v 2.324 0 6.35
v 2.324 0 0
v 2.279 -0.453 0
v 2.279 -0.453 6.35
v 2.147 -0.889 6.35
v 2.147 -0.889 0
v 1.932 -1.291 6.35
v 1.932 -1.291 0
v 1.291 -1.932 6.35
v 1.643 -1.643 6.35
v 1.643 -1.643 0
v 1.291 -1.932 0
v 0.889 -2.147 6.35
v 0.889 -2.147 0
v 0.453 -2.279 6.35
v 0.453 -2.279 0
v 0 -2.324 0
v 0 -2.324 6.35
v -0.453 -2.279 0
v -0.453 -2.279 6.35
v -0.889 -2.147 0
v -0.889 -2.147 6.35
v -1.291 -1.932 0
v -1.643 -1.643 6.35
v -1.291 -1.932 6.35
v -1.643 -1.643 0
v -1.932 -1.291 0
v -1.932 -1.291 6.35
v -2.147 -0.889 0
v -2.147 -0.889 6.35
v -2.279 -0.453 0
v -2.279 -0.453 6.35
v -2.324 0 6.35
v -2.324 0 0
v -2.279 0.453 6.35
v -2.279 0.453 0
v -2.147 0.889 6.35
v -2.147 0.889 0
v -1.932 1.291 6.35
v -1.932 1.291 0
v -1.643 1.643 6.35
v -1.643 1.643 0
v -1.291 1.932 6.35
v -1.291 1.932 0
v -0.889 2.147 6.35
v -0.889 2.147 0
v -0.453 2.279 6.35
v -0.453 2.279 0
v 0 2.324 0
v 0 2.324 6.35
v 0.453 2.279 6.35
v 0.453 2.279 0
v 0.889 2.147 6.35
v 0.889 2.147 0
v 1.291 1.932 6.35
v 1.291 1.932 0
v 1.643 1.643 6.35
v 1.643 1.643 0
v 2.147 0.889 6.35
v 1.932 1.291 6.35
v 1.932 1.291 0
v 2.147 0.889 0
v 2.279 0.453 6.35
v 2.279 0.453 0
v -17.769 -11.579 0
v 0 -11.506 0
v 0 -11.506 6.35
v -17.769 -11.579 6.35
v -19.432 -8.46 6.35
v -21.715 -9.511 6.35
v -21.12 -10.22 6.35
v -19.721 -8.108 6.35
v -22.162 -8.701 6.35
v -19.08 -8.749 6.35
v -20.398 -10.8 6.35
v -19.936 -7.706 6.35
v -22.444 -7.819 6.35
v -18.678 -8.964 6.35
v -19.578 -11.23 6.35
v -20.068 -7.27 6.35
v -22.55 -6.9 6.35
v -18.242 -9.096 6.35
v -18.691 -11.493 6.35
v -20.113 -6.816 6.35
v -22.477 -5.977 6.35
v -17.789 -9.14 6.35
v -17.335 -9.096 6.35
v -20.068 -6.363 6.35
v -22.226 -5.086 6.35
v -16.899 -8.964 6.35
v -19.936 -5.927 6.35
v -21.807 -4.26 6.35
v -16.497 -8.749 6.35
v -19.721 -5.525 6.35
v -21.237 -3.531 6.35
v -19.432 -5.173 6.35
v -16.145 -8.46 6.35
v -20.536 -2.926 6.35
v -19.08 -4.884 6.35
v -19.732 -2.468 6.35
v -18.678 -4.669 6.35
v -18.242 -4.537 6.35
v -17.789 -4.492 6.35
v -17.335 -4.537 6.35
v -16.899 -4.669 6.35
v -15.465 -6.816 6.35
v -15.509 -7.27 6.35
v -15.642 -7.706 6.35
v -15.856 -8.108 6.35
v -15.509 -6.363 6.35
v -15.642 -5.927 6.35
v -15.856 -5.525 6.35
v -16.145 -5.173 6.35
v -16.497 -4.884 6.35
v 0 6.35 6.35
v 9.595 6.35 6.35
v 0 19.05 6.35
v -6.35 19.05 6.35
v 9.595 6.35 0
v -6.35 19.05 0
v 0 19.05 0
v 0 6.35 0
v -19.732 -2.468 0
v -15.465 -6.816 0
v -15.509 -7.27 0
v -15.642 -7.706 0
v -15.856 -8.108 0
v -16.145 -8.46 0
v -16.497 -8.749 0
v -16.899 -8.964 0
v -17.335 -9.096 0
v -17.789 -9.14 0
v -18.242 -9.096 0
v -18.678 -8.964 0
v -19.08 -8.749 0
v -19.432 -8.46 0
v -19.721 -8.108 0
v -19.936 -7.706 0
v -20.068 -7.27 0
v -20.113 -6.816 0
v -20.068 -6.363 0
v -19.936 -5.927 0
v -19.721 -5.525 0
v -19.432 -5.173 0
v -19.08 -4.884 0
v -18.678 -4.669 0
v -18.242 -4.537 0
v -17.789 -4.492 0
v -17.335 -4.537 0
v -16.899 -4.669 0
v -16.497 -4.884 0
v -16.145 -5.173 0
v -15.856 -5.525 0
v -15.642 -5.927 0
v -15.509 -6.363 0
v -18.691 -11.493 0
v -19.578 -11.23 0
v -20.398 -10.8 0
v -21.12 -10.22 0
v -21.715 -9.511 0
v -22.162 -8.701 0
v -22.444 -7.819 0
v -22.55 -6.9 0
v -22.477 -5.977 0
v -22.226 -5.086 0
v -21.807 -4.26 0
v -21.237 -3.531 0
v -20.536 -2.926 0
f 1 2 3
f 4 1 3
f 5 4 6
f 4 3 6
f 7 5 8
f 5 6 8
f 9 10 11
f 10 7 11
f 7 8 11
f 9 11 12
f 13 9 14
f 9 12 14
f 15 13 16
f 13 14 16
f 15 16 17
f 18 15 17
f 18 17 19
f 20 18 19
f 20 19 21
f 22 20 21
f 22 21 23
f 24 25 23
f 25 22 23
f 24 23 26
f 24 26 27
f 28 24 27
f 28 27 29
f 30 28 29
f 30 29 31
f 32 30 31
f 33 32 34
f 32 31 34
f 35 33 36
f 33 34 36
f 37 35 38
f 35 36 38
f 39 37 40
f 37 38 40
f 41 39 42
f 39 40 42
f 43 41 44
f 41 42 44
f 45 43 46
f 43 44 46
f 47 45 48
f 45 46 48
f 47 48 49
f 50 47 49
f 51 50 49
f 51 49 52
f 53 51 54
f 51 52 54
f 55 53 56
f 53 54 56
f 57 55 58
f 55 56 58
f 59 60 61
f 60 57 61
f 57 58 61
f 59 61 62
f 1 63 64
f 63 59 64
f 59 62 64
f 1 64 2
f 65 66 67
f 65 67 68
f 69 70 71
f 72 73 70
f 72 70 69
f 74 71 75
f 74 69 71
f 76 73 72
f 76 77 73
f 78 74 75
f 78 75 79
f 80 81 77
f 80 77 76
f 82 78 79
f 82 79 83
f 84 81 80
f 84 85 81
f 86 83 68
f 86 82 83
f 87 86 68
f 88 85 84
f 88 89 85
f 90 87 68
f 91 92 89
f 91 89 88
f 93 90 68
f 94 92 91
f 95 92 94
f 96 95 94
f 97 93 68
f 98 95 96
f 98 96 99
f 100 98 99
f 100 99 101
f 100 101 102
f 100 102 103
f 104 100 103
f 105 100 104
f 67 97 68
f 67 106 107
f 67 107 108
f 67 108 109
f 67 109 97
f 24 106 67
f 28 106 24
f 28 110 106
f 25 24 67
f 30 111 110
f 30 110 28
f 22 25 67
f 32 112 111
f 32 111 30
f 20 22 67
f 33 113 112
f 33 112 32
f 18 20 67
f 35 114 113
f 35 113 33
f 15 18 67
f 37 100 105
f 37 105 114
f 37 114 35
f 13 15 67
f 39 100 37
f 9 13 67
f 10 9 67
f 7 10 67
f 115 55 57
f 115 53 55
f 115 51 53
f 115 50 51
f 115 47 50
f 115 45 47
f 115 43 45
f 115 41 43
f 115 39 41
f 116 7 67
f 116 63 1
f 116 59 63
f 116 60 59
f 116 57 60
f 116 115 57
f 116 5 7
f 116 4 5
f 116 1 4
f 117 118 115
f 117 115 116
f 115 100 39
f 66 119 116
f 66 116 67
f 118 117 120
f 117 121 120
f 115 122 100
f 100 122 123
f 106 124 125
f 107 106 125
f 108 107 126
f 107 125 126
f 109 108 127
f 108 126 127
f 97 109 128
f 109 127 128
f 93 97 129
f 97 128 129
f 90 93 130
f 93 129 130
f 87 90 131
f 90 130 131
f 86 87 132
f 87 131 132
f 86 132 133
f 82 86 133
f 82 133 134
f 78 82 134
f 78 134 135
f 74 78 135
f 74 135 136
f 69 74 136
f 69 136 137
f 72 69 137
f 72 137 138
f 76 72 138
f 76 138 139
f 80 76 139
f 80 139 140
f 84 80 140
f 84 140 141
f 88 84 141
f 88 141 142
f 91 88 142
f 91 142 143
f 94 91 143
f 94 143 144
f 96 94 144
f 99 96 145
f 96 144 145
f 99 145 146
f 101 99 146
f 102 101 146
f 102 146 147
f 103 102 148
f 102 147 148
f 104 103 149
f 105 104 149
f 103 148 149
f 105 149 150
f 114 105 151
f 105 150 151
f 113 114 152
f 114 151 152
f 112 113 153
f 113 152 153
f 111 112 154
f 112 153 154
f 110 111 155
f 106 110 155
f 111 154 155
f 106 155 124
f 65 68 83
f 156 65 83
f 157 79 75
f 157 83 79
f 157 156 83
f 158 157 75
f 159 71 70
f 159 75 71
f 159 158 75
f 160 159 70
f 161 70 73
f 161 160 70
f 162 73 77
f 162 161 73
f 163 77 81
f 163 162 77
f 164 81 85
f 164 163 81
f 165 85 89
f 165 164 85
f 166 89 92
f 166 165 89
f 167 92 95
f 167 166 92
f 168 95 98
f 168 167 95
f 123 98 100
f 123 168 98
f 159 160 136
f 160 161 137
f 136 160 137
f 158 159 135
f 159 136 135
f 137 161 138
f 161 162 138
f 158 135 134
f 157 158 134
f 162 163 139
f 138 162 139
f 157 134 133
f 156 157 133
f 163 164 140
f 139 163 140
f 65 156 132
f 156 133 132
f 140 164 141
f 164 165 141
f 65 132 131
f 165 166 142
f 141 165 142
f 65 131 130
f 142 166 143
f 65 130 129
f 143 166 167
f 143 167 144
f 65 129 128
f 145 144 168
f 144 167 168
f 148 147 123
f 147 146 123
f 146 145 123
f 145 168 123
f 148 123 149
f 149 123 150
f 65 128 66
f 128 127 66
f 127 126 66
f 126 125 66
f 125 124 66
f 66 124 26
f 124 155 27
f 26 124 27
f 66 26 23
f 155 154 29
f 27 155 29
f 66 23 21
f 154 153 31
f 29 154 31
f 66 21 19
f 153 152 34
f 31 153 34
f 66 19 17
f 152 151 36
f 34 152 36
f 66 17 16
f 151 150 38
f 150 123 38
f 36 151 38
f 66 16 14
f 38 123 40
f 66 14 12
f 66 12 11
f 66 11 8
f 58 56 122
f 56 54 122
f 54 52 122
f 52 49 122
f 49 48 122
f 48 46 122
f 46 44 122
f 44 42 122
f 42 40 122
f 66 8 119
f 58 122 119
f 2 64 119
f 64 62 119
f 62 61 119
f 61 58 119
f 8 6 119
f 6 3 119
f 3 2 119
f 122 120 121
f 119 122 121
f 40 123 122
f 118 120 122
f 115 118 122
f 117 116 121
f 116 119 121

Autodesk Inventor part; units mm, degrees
ref_plane "YZ Plane" through (0, 0, 0) normal (1, 0, 0) x (0, 1, 0)
ref_plane "XZ Plane" through (0, 0, 0) normal (0, 1, 0) x (-1, 0, 0)
ref_plane "XY Plane" through (0, 0, 0) normal (0, 0, 1) x (1, 0, 0)
sketch "Sketch1" plane through (0, 0, 0) normal (0, 0, 1) x (1, 0, 0)
  circle A0 centre (0, 0) radius 2.3241
  circle A1 centre (0, 0) radius 11.5062
  line L0 (0, 0) -> (0, 6.35)
  line L1 (0, 6.35) -> (1.4708, 6.35)
  line L2 (1.4708, 6.35) -> (9.5953, 6.35)
  line L3 (0, 6.35) -> (0, 19.05)
  line L4 (0, 19.05) -> (-6.35, 19.05)
  line L5 (-6.35, 19.05) -> (0, 6.35)
  line L6 (9.5953, 6.35) -> (0, 19.05)
  line L7 (0, 6.35) -> (-35.4663, 6.35)
  circle A2 centre (0, 0) radius 19.05
  line L8 (-30.5707, -30.0948) -> (-7.7493, -41.2459)
  circle A3 centre (4.7977, -18.436) radius 2.3241
  circle A4 centre (4.7977, -18.436) radius 4.7625
  line L9 (4.7977, -18.436) -> (-17.7887, -6.8164)
  circle A5 centre (-17.7887, -6.8164) radius 2.3241
  circle A6 centre (-17.7887, -6.8164) radius 4.7625
  line L10 (0, 6.35) -> (-19.7319, -2.4684)
  line L11 (9.5953, 6.35) -> (0, -11.5062)
  line L12 (0, -11.5062) -> (-17.7693, -11.5789)
  dimension "d0" = 4.6482
  dimension "d1" = 23.0124
  dimension "d2" = 6.35
  dimension "d3" = 12.7
  dimension "d4" = 6.35
  dimension "d5" = 25.4
  dimension "d6" = 4.6482
  dimension "d7" = 9.525
  dimension "d8" = 25.4
  dimension "d9" = 4.6482
  dimension "d10" = 9.525
extrude "Extrusion1" add sketch "Sketch1" along normal blind 6.35 contours L1 L2 L11 A1 L10 | L5 A1 L3 | L3 A1 L6 L2 L1 | L3 L6 A1 | A1 L5 A2 L3 | A1 L12 L9 A6 A2 L10 | A2 L5 L4 | A2 A6 L10 | L12 A2 A6 L9 | A6 L9 A5 A2 | A2 A5 A6 | A6 A2 A5 L9 | L12 A6 A2
properties part number "Goal Jaw Tooth"
